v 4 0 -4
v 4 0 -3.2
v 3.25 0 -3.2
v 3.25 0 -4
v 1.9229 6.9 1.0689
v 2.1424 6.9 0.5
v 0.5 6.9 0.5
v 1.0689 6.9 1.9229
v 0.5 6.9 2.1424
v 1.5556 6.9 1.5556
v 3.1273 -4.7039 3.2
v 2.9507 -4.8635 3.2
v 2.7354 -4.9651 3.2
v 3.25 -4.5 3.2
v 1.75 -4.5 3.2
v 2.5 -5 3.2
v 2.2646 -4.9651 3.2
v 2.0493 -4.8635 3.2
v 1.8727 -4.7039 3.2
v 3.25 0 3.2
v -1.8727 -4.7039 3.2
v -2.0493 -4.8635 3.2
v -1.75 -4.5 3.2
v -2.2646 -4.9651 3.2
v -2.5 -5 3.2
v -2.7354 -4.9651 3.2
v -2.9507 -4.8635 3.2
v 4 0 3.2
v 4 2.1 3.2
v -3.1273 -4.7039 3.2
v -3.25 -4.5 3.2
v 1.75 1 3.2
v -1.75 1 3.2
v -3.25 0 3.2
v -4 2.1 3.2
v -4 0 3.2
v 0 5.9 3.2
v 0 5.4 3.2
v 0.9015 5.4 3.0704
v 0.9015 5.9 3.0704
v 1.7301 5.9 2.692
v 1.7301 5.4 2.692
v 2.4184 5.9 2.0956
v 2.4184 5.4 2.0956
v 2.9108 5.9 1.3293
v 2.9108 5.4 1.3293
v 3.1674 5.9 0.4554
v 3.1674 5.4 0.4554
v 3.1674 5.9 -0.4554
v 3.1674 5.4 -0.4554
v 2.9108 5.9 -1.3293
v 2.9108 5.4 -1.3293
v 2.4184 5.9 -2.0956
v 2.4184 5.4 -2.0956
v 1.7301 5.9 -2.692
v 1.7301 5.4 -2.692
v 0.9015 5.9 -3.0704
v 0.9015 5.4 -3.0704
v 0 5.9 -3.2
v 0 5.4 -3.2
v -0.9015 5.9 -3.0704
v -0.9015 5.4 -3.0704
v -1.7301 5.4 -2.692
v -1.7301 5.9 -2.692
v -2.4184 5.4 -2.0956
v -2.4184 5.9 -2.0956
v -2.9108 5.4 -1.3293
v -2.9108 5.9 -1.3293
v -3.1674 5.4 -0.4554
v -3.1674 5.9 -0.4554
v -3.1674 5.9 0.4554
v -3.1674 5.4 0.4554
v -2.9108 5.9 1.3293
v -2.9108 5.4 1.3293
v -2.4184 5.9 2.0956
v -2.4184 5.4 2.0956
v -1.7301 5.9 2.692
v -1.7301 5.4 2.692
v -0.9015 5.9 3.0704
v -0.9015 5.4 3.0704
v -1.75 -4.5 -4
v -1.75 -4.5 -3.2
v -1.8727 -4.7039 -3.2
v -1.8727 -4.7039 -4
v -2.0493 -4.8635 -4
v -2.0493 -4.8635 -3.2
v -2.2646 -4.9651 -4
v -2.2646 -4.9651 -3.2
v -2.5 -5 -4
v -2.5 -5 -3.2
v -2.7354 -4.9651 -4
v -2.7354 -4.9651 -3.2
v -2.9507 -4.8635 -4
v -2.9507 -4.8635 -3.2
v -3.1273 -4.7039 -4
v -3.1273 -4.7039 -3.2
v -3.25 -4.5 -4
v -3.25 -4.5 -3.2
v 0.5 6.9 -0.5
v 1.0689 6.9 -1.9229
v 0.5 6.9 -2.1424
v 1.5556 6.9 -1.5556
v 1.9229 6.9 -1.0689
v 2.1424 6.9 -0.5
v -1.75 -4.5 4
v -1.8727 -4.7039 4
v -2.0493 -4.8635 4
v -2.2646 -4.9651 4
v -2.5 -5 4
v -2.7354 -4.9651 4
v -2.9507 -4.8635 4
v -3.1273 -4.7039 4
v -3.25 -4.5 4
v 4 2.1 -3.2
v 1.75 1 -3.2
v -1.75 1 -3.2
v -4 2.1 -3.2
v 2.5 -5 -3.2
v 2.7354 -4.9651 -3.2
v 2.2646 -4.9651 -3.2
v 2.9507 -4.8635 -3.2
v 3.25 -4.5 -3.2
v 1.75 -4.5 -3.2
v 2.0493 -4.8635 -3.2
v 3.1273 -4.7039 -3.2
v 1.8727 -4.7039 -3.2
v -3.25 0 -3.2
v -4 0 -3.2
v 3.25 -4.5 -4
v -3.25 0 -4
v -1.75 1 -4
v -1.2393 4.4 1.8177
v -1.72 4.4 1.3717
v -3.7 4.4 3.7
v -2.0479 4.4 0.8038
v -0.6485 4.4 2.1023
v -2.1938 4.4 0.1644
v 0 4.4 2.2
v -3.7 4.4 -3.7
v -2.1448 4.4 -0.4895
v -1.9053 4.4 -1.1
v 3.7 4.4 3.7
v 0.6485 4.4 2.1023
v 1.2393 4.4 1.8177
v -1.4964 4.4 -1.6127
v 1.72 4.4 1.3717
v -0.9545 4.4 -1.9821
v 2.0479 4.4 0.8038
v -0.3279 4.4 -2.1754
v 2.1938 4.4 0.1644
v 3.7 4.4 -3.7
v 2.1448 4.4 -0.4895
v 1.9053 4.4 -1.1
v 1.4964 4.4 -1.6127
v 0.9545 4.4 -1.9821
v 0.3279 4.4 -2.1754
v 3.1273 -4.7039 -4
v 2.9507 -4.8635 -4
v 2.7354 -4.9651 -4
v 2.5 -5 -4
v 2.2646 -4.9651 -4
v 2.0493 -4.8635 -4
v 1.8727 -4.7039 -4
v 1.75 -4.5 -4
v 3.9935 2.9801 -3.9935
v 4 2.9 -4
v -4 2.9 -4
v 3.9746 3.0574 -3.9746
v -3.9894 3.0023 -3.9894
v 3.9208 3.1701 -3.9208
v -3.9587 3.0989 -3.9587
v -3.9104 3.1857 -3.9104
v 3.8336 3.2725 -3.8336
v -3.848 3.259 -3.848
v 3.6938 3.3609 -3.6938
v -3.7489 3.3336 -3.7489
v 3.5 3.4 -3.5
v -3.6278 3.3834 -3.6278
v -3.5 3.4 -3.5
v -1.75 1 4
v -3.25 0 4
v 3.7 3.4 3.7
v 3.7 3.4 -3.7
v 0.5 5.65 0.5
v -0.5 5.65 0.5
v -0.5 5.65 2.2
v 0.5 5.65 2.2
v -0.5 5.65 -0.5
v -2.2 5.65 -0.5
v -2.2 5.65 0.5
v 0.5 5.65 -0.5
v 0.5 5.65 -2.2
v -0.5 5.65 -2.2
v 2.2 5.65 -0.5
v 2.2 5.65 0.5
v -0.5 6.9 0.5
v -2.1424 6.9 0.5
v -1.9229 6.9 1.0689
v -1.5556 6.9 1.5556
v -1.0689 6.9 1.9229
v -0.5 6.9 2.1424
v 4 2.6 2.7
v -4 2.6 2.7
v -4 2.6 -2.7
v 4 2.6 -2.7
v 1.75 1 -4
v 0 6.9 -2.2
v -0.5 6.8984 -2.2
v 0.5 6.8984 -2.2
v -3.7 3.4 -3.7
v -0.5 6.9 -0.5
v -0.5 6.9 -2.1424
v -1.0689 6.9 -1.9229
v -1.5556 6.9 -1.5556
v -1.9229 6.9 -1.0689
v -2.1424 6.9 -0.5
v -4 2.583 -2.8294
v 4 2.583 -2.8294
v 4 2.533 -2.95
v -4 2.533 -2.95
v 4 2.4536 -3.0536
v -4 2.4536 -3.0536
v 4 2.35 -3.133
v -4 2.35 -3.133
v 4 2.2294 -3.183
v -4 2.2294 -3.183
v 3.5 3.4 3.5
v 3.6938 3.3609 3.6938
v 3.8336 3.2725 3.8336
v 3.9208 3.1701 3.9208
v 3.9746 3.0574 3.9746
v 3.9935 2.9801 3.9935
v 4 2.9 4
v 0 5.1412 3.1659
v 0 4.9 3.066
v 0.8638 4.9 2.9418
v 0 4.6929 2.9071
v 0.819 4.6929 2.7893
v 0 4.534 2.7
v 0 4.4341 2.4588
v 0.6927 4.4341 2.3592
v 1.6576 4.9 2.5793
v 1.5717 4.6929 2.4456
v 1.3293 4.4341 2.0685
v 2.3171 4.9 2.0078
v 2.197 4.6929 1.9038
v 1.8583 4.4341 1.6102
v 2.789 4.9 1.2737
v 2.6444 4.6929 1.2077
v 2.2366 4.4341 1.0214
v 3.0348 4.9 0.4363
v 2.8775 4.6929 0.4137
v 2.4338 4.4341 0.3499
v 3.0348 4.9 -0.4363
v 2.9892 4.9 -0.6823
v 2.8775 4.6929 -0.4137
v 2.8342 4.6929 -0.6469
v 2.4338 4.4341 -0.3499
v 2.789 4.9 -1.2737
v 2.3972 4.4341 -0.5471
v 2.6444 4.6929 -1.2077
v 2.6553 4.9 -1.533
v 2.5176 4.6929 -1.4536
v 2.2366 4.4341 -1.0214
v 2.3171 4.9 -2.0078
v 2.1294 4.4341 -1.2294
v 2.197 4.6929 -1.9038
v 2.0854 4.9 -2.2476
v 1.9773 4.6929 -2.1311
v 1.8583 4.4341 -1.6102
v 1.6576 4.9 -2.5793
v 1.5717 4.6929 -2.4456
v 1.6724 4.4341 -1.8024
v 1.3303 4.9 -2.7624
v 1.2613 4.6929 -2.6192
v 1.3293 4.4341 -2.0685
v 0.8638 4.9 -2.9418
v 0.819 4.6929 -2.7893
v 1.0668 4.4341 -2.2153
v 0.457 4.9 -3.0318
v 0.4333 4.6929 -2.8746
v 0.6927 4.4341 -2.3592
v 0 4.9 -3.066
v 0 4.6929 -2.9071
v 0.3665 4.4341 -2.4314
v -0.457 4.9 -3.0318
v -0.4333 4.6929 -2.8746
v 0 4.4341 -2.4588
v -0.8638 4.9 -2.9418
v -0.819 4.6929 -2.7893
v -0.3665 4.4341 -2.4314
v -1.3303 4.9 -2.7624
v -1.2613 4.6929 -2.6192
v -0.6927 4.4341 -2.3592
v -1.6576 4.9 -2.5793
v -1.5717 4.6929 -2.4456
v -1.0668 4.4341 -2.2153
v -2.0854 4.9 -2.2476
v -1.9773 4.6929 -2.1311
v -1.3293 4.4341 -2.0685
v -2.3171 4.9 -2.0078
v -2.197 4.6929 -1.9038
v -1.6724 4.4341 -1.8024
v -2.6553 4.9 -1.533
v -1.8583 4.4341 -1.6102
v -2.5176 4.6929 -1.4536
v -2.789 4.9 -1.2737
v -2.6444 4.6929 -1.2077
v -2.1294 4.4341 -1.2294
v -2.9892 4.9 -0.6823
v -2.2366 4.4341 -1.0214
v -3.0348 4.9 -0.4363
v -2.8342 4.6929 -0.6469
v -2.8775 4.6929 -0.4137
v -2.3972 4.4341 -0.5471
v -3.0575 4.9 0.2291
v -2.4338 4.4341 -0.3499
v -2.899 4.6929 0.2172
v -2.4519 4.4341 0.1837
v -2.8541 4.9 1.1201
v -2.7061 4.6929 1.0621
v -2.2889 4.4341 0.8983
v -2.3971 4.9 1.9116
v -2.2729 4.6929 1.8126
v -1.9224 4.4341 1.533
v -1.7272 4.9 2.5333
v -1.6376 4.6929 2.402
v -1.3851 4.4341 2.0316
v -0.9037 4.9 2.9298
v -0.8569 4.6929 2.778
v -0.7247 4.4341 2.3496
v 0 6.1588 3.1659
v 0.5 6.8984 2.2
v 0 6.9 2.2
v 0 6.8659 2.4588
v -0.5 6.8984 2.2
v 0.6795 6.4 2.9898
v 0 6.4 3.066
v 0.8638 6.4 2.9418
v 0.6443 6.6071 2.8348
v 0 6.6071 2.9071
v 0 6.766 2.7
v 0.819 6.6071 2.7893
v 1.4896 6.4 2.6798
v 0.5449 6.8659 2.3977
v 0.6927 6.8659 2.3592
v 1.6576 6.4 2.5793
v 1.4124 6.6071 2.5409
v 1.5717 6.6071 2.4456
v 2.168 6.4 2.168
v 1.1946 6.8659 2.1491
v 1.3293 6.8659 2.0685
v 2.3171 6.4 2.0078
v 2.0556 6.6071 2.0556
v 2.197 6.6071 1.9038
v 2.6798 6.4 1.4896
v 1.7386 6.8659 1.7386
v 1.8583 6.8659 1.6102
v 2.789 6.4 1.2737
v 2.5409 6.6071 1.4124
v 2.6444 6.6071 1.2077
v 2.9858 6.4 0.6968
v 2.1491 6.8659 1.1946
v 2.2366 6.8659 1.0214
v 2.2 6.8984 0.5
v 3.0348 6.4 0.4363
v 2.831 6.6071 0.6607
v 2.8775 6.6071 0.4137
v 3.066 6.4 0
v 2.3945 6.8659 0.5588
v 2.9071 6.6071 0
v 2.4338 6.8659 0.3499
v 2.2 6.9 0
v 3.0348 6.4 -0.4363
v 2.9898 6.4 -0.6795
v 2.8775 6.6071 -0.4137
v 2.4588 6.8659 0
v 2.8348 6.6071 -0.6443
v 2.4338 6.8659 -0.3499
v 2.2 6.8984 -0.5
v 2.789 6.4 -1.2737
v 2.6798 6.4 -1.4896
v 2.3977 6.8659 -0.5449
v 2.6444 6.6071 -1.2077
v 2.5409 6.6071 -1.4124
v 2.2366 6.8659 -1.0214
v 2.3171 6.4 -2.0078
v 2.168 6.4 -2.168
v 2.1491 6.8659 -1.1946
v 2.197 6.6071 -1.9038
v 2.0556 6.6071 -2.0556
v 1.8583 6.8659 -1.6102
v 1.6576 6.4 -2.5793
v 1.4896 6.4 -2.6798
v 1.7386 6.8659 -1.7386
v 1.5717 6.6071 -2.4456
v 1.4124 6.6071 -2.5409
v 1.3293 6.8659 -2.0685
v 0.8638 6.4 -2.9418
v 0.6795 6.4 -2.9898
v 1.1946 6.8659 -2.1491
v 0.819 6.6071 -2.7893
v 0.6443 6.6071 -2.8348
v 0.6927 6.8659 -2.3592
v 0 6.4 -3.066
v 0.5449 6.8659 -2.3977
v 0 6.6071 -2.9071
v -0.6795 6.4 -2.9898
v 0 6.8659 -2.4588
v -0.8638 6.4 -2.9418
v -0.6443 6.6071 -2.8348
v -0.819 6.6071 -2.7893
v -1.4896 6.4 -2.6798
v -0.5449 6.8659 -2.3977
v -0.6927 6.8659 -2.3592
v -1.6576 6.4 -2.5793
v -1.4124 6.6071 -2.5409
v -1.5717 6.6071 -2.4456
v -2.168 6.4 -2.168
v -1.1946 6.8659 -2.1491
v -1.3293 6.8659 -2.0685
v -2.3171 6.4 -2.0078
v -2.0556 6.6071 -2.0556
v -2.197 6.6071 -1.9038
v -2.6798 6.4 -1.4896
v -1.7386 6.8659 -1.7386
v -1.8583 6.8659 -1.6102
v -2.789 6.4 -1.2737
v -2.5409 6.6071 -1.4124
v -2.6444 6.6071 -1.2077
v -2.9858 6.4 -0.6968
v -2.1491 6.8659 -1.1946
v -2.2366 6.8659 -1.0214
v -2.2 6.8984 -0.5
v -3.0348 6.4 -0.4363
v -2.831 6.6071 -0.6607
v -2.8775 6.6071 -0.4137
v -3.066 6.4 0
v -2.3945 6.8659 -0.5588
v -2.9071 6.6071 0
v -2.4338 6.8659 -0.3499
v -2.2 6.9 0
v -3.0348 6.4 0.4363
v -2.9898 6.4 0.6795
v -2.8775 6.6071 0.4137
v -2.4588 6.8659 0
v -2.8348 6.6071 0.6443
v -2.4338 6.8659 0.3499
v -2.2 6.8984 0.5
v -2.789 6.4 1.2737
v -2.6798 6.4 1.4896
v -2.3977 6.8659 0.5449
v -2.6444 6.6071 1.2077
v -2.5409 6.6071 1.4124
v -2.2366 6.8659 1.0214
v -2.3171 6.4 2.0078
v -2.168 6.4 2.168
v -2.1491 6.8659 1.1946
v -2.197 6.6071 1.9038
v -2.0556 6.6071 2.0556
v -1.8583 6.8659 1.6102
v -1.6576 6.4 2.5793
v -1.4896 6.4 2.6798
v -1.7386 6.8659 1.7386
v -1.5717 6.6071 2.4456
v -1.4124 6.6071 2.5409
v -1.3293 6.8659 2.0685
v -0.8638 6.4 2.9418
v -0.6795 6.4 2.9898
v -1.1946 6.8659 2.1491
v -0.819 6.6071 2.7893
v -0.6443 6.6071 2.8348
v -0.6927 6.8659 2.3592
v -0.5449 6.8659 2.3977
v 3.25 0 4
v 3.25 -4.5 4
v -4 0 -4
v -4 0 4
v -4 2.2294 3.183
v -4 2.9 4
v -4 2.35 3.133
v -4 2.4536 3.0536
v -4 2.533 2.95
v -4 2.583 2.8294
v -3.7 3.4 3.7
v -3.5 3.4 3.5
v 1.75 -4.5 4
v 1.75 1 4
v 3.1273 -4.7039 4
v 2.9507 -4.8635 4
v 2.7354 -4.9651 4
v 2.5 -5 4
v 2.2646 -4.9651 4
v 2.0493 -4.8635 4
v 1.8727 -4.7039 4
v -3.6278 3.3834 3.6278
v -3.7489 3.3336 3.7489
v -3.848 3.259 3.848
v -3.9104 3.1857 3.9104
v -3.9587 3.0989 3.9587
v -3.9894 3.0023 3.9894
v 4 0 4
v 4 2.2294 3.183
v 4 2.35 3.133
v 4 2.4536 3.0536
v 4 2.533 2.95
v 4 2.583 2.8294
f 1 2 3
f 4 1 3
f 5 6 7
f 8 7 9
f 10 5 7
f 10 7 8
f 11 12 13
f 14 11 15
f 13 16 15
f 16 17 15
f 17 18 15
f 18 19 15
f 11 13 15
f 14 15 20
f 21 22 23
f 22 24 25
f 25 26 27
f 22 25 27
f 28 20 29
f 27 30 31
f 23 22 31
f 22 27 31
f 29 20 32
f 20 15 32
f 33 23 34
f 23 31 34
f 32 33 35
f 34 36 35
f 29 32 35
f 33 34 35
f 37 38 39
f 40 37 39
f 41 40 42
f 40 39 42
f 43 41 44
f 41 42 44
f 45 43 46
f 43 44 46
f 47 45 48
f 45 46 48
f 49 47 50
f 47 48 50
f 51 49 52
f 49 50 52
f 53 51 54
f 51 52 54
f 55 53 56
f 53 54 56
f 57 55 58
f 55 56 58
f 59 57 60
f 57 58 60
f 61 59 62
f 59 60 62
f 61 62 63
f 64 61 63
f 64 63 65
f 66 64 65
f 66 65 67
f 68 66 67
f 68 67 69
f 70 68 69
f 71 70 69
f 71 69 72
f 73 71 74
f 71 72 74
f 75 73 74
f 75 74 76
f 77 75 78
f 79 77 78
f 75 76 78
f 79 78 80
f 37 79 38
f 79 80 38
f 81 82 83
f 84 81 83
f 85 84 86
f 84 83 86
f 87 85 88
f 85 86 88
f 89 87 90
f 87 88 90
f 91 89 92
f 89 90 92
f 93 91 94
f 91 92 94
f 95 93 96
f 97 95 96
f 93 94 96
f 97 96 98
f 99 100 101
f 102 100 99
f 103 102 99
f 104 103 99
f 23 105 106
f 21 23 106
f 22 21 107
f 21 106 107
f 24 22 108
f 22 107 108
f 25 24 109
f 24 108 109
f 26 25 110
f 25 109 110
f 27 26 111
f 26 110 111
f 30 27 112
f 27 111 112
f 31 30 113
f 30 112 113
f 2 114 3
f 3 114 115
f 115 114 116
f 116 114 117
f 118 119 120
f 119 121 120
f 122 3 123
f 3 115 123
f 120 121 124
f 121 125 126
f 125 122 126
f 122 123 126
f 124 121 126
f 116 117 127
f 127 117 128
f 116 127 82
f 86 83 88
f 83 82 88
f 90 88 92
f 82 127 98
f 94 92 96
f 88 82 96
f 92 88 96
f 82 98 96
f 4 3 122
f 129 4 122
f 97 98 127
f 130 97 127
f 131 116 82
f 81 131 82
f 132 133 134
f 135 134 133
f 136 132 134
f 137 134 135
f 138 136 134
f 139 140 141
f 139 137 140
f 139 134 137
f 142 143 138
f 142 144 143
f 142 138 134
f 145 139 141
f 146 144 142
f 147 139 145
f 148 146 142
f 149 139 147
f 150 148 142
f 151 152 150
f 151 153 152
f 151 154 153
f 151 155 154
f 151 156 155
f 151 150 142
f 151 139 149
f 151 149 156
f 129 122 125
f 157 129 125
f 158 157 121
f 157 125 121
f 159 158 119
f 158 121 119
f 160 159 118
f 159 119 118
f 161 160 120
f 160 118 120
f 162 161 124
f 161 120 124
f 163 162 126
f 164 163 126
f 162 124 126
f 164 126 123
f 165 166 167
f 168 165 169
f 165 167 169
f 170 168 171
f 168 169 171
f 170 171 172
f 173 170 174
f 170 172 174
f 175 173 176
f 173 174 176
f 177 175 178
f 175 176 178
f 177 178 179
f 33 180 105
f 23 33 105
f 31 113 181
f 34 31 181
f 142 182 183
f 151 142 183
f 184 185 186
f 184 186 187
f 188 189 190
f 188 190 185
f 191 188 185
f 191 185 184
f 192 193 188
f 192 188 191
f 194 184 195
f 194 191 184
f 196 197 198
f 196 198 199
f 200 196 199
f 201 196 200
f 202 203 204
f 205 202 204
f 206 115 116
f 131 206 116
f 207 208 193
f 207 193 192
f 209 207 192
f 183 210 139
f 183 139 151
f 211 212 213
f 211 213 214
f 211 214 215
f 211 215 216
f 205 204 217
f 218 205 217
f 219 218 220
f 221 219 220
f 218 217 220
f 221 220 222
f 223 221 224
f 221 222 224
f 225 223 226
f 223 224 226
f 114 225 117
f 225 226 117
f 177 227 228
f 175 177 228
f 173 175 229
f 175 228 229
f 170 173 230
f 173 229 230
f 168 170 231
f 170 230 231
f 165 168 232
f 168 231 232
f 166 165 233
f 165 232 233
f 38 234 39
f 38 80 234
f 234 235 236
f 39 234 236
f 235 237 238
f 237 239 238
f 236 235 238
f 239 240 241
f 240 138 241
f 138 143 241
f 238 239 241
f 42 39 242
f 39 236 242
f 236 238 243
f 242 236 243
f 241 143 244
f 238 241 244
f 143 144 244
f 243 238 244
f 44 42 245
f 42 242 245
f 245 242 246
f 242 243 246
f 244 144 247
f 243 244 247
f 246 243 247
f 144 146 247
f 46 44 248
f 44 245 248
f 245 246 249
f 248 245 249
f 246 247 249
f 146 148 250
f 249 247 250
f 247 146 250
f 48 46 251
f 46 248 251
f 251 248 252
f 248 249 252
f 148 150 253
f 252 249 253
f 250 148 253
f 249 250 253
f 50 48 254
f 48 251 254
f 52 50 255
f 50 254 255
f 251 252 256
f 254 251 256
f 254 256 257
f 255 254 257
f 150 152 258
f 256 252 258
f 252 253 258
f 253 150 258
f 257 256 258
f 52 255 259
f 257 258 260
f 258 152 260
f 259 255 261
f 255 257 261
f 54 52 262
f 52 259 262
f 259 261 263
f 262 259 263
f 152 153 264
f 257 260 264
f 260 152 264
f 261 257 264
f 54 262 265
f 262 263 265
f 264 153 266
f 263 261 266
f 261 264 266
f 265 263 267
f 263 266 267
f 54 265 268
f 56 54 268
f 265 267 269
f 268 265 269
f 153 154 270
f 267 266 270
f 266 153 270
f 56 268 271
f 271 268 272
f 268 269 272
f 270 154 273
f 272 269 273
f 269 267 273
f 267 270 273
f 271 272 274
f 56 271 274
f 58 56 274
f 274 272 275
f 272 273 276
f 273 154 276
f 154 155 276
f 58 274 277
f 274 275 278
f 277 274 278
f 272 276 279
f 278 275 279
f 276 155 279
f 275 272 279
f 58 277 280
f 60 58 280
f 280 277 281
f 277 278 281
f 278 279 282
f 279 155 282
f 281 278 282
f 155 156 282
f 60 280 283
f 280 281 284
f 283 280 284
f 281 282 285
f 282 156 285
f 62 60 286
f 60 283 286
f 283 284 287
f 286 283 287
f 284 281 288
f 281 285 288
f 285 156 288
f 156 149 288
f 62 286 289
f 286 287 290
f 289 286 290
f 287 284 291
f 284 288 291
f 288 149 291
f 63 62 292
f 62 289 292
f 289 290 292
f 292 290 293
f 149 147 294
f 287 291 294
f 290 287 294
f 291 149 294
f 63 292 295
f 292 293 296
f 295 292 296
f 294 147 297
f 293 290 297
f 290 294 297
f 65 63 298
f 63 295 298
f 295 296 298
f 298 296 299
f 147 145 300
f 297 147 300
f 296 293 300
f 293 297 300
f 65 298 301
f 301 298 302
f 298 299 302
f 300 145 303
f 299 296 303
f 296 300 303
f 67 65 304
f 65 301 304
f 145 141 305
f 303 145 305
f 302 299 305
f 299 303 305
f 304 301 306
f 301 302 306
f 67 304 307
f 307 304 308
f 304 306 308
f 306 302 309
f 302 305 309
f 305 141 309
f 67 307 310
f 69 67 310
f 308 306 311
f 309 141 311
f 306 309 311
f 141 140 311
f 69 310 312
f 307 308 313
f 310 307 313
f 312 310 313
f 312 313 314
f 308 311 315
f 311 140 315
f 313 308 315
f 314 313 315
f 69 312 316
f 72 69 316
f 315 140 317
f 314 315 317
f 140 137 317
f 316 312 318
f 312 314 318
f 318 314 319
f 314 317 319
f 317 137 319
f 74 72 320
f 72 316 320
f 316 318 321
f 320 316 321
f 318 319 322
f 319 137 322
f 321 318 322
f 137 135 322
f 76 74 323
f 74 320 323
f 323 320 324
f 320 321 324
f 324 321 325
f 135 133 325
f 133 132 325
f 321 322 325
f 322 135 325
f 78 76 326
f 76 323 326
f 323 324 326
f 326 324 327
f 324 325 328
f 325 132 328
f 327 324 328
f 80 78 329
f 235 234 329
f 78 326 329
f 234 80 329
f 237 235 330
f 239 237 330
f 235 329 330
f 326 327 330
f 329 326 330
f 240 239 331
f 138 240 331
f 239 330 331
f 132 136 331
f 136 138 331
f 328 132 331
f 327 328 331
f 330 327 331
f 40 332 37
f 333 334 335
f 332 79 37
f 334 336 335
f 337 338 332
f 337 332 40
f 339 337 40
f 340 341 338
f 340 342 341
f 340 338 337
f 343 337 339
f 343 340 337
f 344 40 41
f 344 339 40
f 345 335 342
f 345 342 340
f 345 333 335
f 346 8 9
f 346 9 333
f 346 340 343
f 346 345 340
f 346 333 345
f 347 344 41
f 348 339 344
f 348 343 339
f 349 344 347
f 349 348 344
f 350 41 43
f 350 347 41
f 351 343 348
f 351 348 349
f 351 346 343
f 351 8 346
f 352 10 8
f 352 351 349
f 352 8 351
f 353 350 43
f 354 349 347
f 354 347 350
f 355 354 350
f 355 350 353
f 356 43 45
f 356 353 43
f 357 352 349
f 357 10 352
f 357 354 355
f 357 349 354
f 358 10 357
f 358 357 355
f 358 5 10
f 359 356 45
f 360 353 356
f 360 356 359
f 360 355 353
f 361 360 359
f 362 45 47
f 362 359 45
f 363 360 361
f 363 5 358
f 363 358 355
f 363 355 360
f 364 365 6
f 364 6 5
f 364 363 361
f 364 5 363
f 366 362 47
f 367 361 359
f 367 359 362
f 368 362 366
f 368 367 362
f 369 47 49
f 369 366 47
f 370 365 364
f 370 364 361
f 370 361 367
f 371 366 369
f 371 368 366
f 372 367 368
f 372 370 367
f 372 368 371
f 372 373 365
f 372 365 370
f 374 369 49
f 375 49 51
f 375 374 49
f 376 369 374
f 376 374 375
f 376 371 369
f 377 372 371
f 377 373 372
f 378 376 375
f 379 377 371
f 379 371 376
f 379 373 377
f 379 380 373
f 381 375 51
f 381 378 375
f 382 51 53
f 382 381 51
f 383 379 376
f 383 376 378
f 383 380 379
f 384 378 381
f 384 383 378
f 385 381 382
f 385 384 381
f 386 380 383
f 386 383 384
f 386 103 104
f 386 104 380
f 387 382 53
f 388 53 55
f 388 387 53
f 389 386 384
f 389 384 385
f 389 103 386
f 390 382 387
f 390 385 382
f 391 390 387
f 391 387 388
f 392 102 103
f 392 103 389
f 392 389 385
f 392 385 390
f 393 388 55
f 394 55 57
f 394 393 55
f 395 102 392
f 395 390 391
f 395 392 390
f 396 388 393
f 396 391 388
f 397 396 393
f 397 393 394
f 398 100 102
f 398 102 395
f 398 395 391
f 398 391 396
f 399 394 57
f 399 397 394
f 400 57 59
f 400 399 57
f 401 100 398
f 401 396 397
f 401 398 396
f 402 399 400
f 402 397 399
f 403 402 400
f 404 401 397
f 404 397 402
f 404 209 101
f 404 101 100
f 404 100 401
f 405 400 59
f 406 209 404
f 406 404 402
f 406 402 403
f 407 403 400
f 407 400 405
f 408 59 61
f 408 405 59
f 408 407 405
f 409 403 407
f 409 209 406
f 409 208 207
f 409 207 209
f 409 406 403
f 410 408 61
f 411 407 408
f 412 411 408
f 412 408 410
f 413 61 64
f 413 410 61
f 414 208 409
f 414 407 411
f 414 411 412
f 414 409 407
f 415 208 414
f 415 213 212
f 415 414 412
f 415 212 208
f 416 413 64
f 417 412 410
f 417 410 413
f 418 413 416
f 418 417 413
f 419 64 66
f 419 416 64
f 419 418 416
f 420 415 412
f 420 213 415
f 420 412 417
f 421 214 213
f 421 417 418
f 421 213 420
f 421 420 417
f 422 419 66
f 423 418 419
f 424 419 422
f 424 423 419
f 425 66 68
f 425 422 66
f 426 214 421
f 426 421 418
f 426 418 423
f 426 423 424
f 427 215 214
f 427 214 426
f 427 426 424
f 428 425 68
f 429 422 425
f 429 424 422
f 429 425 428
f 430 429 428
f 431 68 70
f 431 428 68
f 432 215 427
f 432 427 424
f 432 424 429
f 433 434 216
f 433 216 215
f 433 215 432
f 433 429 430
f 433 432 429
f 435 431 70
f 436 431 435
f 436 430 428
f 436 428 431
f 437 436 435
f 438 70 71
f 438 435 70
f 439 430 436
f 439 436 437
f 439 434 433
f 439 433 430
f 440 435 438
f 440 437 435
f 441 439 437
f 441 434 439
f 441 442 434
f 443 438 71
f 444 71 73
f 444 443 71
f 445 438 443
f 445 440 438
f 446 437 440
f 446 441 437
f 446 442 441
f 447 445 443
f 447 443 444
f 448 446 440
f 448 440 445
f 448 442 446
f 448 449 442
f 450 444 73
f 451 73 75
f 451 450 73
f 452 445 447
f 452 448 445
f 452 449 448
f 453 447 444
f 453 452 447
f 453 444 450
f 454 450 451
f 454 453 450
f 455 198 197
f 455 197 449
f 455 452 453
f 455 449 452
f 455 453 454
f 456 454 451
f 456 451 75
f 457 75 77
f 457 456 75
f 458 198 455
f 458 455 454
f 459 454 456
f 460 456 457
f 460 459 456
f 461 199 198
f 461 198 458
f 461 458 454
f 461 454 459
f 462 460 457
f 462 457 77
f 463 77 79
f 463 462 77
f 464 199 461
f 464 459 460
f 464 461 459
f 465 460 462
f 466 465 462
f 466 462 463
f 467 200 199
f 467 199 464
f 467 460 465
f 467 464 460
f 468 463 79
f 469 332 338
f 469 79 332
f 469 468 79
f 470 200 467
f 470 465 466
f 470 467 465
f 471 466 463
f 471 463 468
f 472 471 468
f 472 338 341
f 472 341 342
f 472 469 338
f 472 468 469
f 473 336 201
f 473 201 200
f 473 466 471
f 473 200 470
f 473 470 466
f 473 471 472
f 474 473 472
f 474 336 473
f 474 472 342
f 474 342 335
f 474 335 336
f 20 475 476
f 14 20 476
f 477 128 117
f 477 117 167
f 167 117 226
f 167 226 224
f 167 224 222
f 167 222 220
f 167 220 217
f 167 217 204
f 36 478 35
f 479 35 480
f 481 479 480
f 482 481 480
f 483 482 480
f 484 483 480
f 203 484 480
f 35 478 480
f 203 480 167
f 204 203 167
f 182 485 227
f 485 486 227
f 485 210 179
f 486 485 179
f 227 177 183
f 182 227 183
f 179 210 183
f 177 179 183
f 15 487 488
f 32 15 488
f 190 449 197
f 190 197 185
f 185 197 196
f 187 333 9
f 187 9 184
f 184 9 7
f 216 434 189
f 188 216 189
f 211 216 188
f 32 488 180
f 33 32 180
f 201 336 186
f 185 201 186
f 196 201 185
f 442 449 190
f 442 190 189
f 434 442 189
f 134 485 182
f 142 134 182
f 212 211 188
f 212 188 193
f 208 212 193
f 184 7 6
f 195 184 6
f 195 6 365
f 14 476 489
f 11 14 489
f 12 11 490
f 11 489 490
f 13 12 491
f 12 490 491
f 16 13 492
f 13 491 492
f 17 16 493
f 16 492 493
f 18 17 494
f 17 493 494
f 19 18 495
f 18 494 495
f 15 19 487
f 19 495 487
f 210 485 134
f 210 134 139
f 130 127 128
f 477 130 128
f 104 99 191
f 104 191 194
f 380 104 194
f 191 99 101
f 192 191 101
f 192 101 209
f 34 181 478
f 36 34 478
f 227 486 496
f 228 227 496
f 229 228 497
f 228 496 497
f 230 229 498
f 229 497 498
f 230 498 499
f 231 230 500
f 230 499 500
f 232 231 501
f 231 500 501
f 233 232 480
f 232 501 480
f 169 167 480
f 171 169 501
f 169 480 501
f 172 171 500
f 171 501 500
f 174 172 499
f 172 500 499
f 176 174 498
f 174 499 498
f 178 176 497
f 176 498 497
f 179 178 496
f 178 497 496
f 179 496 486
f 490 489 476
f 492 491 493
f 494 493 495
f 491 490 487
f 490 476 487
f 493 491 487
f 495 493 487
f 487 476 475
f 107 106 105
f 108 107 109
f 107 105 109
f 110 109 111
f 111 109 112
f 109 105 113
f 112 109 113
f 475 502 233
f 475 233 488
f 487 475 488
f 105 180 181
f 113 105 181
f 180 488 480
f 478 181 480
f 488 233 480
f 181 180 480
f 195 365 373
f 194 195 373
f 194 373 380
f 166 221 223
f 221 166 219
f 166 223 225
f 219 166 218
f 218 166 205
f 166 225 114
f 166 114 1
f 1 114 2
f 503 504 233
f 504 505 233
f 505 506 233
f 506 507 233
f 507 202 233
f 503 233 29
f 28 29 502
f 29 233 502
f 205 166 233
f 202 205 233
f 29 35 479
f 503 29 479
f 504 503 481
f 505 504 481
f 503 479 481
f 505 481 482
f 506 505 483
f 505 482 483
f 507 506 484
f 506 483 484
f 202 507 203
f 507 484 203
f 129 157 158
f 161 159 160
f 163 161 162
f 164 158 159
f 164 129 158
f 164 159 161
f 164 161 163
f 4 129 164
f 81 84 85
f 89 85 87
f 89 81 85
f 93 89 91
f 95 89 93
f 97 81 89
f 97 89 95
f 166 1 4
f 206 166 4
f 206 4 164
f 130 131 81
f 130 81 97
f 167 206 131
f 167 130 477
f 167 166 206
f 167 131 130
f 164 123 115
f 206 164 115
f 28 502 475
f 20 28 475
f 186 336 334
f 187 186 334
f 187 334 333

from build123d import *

# Parameters (mm, degrees)
BOSS_EXTRUDE1_DEPTH     = 4
CUT_EXTRUDE1_DEPTH      = 8.549834435
CUT_EXTRUDE1_DEPTH_BACK = 8.549834435
FILLET1_R               = 0.5
SKETCH4_R               = 1.5
BOSS_EXTRUDE2_DEPTH     = 1
SKETCH5_R               = 3.2
BOSS_EXTRUDE3_DEPTH     = 2.5
FILLET2_R               = 1
SKETCH6_W               = 1
SKETCH6_H               = 4.4
SKETCH6_W_2             = 4.4
SKETCH6_H_2             = 1
CUT_EXTRUDE_THIN1_DEPTH = 1.25
SKETCH8_W               = 7.4
SKETCH8_H               = 7.4
BOSS_EXTRUDE4_DEPTH     = 1


with BuildPart() as part:
    # Sketch1 → Boss-Extrude1 (new, symmetric)
    with BuildSketch(Plane.XY):
        with BuildLine():
            Line((-1.75, 1), (-1.75, -4.5))
            ThreePointArc((-1.75, -4.5), (-2.5, -5), (-3.25, -4.5))
            Line((-3.25, -4.5), (-3.25, 0))
            Line((-3.25, 0), (-4, 0))
            Line((-4, 0), (-4, 2.9))
            ThreePointArc((-4, 2.9), (-3.853553391, 3.253553391), (-3.5, 3.4))
            Line((-3.5, 3.4), (3.5, 3.4))
            ThreePointArc((3.5, 3.4), (3.853553391, 3.253553391), (4, 2.9))
            Line((4, 2.9), (4, 0))
            Line((4, 0), (3.25, 0))
            Line((3.25, 0), (3.25, -4.5))
            ThreePointArc((3.25, -4.5), (2.5, -5), (1.75, -4.5))
            Line((1.75, -4.5), (1.75, 1))
            Line((1.75, 1), (-1.75, 1))
        make_face()
    extrude(amount=BOSS_EXTRUDE1_DEPTH, both=True)

    # Sketch3 → Cut-Extrude1 (cut, two sides: drawn at the far end of the back side and taken through both)
    with BuildSketch(Plane(origin=(0, 0, 0), x_dir=(0, 0, -1), z_dir=(1, 0, 0)).offset(-CUT_EXTRUDE1_DEPTH_BACK)):
        with BuildLine():
            Line((-3.2, -5), (-3.2, 2.1))
            ThreePointArc((-3.2, 2.1), (-3.053553391, 2.453553391), (-2.7, 2.6))
            Line((-2.7, 2.6), (2.7, 2.6))
            ThreePointArc((2.7, 2.6), (3.053553391, 2.453553391), (3.2, 2.1))
            Line((3.2, 2.1), (3.2, -5))
            Line((3.2, -5), (-3.2, -5))
        make_face()
    extrude(amount=CUT_EXTRUDE1_DEPTH + CUT_EXTRUDE1_DEPTH_BACK, mode=Mode.SUBTRACT)

    # Fillet1
    # the kernel refuses this fillet: 0.5 mm, written as the material it takes off along each edge
    with BuildSketch(Plane(origin=(-4.75, 3.4, -4), x_dir=(0, -1, 0), z_dir=(1, 0, 0))) as fillet1_piece_1:
        with BuildLine():
            CenterArc((FILLET1_R, -FILLET1_R), FILLET1_R, 90, 90)
            Line((0, -FILLET1_R), (0, 0))
            Line((0, 0), (FILLET1_R, 0))
        make_face()
    extrude(amount=9.5, mode=Mode.SUBTRACT)
    with BuildSketch(Plane(origin=(-4.75, 3.4, 4), x_dir=(0, -1, 0), z_dir=(1, 0, 0))) as fillet1_piece_2:
        with BuildLine():
            CenterArc((FILLET1_R, FILLET1_R), FILLET1_R, 180, 90)
            Line((0, FILLET1_R), (0, 0))
            Line((0, 0), (FILLET1_R, 0))
        make_face()
    extrude(amount=9.5, mode=Mode.SUBTRACT)

    # Sketch4 → Boss-Extrude2 (add)
    with BuildSketch(Plane(origin=(0, 3.4, 0), x_dir=(1, 0, 0), z_dir=(0, 1, 0))):
        with Locations(Location((0, 0, 0), (0, 0, 90))):
            Circle(SKETCH4_R)
    extrude(amount=BOSS_EXTRUDE2_DEPTH)

    # Sketch5 → Boss-Extrude3 (add)
    with BuildSketch(Plane(origin=(0, 4.4, 0), x_dir=(1, 0, 0), z_dir=(0, 1, 0))):
        with Locations(Location((0, 0, 0), (0, 0, 270))):
            Circle(SKETCH5_R)
    extrude(amount=BOSS_EXTRUDE3_DEPTH)

    # Fillet2
    fillet2_edges = [part.edges().sort_by_distance(p)[0] for p in [
        (0, 4.4, -3.2),
        (0, 6.9, -3.2),
    ]]
    fillet(fillet2_edges, radius=FILLET2_R)

    # Sketch6 → Cut-Extrude-Thin1 (cut)
    with BuildSketch(Plane(origin=(0, 6.9, 0), x_dir=(1, 0, 0), z_dir=(0, 1, 0))):
        Rectangle(SKETCH6_W, SKETCH6_H)
        Rectangle(SKETCH6_W_2, SKETCH6_H_2)
    extrude(amount=-CUT_EXTRUDE_THIN1_DEPTH, mode=Mode.SUBTRACT)

    # Sketch8 → Boss-Extrude4 (add)
    with BuildSketch(Plane(origin=(0, 3.4, 0), x_dir=(1, 0, 0), z_dir=(0, 1, 0))):
        Rectangle(SKETCH8_W, SKETCH8_H)
    extrude(amount=BOSS_EXTRUDE4_DEPTH)


solid = part.part
